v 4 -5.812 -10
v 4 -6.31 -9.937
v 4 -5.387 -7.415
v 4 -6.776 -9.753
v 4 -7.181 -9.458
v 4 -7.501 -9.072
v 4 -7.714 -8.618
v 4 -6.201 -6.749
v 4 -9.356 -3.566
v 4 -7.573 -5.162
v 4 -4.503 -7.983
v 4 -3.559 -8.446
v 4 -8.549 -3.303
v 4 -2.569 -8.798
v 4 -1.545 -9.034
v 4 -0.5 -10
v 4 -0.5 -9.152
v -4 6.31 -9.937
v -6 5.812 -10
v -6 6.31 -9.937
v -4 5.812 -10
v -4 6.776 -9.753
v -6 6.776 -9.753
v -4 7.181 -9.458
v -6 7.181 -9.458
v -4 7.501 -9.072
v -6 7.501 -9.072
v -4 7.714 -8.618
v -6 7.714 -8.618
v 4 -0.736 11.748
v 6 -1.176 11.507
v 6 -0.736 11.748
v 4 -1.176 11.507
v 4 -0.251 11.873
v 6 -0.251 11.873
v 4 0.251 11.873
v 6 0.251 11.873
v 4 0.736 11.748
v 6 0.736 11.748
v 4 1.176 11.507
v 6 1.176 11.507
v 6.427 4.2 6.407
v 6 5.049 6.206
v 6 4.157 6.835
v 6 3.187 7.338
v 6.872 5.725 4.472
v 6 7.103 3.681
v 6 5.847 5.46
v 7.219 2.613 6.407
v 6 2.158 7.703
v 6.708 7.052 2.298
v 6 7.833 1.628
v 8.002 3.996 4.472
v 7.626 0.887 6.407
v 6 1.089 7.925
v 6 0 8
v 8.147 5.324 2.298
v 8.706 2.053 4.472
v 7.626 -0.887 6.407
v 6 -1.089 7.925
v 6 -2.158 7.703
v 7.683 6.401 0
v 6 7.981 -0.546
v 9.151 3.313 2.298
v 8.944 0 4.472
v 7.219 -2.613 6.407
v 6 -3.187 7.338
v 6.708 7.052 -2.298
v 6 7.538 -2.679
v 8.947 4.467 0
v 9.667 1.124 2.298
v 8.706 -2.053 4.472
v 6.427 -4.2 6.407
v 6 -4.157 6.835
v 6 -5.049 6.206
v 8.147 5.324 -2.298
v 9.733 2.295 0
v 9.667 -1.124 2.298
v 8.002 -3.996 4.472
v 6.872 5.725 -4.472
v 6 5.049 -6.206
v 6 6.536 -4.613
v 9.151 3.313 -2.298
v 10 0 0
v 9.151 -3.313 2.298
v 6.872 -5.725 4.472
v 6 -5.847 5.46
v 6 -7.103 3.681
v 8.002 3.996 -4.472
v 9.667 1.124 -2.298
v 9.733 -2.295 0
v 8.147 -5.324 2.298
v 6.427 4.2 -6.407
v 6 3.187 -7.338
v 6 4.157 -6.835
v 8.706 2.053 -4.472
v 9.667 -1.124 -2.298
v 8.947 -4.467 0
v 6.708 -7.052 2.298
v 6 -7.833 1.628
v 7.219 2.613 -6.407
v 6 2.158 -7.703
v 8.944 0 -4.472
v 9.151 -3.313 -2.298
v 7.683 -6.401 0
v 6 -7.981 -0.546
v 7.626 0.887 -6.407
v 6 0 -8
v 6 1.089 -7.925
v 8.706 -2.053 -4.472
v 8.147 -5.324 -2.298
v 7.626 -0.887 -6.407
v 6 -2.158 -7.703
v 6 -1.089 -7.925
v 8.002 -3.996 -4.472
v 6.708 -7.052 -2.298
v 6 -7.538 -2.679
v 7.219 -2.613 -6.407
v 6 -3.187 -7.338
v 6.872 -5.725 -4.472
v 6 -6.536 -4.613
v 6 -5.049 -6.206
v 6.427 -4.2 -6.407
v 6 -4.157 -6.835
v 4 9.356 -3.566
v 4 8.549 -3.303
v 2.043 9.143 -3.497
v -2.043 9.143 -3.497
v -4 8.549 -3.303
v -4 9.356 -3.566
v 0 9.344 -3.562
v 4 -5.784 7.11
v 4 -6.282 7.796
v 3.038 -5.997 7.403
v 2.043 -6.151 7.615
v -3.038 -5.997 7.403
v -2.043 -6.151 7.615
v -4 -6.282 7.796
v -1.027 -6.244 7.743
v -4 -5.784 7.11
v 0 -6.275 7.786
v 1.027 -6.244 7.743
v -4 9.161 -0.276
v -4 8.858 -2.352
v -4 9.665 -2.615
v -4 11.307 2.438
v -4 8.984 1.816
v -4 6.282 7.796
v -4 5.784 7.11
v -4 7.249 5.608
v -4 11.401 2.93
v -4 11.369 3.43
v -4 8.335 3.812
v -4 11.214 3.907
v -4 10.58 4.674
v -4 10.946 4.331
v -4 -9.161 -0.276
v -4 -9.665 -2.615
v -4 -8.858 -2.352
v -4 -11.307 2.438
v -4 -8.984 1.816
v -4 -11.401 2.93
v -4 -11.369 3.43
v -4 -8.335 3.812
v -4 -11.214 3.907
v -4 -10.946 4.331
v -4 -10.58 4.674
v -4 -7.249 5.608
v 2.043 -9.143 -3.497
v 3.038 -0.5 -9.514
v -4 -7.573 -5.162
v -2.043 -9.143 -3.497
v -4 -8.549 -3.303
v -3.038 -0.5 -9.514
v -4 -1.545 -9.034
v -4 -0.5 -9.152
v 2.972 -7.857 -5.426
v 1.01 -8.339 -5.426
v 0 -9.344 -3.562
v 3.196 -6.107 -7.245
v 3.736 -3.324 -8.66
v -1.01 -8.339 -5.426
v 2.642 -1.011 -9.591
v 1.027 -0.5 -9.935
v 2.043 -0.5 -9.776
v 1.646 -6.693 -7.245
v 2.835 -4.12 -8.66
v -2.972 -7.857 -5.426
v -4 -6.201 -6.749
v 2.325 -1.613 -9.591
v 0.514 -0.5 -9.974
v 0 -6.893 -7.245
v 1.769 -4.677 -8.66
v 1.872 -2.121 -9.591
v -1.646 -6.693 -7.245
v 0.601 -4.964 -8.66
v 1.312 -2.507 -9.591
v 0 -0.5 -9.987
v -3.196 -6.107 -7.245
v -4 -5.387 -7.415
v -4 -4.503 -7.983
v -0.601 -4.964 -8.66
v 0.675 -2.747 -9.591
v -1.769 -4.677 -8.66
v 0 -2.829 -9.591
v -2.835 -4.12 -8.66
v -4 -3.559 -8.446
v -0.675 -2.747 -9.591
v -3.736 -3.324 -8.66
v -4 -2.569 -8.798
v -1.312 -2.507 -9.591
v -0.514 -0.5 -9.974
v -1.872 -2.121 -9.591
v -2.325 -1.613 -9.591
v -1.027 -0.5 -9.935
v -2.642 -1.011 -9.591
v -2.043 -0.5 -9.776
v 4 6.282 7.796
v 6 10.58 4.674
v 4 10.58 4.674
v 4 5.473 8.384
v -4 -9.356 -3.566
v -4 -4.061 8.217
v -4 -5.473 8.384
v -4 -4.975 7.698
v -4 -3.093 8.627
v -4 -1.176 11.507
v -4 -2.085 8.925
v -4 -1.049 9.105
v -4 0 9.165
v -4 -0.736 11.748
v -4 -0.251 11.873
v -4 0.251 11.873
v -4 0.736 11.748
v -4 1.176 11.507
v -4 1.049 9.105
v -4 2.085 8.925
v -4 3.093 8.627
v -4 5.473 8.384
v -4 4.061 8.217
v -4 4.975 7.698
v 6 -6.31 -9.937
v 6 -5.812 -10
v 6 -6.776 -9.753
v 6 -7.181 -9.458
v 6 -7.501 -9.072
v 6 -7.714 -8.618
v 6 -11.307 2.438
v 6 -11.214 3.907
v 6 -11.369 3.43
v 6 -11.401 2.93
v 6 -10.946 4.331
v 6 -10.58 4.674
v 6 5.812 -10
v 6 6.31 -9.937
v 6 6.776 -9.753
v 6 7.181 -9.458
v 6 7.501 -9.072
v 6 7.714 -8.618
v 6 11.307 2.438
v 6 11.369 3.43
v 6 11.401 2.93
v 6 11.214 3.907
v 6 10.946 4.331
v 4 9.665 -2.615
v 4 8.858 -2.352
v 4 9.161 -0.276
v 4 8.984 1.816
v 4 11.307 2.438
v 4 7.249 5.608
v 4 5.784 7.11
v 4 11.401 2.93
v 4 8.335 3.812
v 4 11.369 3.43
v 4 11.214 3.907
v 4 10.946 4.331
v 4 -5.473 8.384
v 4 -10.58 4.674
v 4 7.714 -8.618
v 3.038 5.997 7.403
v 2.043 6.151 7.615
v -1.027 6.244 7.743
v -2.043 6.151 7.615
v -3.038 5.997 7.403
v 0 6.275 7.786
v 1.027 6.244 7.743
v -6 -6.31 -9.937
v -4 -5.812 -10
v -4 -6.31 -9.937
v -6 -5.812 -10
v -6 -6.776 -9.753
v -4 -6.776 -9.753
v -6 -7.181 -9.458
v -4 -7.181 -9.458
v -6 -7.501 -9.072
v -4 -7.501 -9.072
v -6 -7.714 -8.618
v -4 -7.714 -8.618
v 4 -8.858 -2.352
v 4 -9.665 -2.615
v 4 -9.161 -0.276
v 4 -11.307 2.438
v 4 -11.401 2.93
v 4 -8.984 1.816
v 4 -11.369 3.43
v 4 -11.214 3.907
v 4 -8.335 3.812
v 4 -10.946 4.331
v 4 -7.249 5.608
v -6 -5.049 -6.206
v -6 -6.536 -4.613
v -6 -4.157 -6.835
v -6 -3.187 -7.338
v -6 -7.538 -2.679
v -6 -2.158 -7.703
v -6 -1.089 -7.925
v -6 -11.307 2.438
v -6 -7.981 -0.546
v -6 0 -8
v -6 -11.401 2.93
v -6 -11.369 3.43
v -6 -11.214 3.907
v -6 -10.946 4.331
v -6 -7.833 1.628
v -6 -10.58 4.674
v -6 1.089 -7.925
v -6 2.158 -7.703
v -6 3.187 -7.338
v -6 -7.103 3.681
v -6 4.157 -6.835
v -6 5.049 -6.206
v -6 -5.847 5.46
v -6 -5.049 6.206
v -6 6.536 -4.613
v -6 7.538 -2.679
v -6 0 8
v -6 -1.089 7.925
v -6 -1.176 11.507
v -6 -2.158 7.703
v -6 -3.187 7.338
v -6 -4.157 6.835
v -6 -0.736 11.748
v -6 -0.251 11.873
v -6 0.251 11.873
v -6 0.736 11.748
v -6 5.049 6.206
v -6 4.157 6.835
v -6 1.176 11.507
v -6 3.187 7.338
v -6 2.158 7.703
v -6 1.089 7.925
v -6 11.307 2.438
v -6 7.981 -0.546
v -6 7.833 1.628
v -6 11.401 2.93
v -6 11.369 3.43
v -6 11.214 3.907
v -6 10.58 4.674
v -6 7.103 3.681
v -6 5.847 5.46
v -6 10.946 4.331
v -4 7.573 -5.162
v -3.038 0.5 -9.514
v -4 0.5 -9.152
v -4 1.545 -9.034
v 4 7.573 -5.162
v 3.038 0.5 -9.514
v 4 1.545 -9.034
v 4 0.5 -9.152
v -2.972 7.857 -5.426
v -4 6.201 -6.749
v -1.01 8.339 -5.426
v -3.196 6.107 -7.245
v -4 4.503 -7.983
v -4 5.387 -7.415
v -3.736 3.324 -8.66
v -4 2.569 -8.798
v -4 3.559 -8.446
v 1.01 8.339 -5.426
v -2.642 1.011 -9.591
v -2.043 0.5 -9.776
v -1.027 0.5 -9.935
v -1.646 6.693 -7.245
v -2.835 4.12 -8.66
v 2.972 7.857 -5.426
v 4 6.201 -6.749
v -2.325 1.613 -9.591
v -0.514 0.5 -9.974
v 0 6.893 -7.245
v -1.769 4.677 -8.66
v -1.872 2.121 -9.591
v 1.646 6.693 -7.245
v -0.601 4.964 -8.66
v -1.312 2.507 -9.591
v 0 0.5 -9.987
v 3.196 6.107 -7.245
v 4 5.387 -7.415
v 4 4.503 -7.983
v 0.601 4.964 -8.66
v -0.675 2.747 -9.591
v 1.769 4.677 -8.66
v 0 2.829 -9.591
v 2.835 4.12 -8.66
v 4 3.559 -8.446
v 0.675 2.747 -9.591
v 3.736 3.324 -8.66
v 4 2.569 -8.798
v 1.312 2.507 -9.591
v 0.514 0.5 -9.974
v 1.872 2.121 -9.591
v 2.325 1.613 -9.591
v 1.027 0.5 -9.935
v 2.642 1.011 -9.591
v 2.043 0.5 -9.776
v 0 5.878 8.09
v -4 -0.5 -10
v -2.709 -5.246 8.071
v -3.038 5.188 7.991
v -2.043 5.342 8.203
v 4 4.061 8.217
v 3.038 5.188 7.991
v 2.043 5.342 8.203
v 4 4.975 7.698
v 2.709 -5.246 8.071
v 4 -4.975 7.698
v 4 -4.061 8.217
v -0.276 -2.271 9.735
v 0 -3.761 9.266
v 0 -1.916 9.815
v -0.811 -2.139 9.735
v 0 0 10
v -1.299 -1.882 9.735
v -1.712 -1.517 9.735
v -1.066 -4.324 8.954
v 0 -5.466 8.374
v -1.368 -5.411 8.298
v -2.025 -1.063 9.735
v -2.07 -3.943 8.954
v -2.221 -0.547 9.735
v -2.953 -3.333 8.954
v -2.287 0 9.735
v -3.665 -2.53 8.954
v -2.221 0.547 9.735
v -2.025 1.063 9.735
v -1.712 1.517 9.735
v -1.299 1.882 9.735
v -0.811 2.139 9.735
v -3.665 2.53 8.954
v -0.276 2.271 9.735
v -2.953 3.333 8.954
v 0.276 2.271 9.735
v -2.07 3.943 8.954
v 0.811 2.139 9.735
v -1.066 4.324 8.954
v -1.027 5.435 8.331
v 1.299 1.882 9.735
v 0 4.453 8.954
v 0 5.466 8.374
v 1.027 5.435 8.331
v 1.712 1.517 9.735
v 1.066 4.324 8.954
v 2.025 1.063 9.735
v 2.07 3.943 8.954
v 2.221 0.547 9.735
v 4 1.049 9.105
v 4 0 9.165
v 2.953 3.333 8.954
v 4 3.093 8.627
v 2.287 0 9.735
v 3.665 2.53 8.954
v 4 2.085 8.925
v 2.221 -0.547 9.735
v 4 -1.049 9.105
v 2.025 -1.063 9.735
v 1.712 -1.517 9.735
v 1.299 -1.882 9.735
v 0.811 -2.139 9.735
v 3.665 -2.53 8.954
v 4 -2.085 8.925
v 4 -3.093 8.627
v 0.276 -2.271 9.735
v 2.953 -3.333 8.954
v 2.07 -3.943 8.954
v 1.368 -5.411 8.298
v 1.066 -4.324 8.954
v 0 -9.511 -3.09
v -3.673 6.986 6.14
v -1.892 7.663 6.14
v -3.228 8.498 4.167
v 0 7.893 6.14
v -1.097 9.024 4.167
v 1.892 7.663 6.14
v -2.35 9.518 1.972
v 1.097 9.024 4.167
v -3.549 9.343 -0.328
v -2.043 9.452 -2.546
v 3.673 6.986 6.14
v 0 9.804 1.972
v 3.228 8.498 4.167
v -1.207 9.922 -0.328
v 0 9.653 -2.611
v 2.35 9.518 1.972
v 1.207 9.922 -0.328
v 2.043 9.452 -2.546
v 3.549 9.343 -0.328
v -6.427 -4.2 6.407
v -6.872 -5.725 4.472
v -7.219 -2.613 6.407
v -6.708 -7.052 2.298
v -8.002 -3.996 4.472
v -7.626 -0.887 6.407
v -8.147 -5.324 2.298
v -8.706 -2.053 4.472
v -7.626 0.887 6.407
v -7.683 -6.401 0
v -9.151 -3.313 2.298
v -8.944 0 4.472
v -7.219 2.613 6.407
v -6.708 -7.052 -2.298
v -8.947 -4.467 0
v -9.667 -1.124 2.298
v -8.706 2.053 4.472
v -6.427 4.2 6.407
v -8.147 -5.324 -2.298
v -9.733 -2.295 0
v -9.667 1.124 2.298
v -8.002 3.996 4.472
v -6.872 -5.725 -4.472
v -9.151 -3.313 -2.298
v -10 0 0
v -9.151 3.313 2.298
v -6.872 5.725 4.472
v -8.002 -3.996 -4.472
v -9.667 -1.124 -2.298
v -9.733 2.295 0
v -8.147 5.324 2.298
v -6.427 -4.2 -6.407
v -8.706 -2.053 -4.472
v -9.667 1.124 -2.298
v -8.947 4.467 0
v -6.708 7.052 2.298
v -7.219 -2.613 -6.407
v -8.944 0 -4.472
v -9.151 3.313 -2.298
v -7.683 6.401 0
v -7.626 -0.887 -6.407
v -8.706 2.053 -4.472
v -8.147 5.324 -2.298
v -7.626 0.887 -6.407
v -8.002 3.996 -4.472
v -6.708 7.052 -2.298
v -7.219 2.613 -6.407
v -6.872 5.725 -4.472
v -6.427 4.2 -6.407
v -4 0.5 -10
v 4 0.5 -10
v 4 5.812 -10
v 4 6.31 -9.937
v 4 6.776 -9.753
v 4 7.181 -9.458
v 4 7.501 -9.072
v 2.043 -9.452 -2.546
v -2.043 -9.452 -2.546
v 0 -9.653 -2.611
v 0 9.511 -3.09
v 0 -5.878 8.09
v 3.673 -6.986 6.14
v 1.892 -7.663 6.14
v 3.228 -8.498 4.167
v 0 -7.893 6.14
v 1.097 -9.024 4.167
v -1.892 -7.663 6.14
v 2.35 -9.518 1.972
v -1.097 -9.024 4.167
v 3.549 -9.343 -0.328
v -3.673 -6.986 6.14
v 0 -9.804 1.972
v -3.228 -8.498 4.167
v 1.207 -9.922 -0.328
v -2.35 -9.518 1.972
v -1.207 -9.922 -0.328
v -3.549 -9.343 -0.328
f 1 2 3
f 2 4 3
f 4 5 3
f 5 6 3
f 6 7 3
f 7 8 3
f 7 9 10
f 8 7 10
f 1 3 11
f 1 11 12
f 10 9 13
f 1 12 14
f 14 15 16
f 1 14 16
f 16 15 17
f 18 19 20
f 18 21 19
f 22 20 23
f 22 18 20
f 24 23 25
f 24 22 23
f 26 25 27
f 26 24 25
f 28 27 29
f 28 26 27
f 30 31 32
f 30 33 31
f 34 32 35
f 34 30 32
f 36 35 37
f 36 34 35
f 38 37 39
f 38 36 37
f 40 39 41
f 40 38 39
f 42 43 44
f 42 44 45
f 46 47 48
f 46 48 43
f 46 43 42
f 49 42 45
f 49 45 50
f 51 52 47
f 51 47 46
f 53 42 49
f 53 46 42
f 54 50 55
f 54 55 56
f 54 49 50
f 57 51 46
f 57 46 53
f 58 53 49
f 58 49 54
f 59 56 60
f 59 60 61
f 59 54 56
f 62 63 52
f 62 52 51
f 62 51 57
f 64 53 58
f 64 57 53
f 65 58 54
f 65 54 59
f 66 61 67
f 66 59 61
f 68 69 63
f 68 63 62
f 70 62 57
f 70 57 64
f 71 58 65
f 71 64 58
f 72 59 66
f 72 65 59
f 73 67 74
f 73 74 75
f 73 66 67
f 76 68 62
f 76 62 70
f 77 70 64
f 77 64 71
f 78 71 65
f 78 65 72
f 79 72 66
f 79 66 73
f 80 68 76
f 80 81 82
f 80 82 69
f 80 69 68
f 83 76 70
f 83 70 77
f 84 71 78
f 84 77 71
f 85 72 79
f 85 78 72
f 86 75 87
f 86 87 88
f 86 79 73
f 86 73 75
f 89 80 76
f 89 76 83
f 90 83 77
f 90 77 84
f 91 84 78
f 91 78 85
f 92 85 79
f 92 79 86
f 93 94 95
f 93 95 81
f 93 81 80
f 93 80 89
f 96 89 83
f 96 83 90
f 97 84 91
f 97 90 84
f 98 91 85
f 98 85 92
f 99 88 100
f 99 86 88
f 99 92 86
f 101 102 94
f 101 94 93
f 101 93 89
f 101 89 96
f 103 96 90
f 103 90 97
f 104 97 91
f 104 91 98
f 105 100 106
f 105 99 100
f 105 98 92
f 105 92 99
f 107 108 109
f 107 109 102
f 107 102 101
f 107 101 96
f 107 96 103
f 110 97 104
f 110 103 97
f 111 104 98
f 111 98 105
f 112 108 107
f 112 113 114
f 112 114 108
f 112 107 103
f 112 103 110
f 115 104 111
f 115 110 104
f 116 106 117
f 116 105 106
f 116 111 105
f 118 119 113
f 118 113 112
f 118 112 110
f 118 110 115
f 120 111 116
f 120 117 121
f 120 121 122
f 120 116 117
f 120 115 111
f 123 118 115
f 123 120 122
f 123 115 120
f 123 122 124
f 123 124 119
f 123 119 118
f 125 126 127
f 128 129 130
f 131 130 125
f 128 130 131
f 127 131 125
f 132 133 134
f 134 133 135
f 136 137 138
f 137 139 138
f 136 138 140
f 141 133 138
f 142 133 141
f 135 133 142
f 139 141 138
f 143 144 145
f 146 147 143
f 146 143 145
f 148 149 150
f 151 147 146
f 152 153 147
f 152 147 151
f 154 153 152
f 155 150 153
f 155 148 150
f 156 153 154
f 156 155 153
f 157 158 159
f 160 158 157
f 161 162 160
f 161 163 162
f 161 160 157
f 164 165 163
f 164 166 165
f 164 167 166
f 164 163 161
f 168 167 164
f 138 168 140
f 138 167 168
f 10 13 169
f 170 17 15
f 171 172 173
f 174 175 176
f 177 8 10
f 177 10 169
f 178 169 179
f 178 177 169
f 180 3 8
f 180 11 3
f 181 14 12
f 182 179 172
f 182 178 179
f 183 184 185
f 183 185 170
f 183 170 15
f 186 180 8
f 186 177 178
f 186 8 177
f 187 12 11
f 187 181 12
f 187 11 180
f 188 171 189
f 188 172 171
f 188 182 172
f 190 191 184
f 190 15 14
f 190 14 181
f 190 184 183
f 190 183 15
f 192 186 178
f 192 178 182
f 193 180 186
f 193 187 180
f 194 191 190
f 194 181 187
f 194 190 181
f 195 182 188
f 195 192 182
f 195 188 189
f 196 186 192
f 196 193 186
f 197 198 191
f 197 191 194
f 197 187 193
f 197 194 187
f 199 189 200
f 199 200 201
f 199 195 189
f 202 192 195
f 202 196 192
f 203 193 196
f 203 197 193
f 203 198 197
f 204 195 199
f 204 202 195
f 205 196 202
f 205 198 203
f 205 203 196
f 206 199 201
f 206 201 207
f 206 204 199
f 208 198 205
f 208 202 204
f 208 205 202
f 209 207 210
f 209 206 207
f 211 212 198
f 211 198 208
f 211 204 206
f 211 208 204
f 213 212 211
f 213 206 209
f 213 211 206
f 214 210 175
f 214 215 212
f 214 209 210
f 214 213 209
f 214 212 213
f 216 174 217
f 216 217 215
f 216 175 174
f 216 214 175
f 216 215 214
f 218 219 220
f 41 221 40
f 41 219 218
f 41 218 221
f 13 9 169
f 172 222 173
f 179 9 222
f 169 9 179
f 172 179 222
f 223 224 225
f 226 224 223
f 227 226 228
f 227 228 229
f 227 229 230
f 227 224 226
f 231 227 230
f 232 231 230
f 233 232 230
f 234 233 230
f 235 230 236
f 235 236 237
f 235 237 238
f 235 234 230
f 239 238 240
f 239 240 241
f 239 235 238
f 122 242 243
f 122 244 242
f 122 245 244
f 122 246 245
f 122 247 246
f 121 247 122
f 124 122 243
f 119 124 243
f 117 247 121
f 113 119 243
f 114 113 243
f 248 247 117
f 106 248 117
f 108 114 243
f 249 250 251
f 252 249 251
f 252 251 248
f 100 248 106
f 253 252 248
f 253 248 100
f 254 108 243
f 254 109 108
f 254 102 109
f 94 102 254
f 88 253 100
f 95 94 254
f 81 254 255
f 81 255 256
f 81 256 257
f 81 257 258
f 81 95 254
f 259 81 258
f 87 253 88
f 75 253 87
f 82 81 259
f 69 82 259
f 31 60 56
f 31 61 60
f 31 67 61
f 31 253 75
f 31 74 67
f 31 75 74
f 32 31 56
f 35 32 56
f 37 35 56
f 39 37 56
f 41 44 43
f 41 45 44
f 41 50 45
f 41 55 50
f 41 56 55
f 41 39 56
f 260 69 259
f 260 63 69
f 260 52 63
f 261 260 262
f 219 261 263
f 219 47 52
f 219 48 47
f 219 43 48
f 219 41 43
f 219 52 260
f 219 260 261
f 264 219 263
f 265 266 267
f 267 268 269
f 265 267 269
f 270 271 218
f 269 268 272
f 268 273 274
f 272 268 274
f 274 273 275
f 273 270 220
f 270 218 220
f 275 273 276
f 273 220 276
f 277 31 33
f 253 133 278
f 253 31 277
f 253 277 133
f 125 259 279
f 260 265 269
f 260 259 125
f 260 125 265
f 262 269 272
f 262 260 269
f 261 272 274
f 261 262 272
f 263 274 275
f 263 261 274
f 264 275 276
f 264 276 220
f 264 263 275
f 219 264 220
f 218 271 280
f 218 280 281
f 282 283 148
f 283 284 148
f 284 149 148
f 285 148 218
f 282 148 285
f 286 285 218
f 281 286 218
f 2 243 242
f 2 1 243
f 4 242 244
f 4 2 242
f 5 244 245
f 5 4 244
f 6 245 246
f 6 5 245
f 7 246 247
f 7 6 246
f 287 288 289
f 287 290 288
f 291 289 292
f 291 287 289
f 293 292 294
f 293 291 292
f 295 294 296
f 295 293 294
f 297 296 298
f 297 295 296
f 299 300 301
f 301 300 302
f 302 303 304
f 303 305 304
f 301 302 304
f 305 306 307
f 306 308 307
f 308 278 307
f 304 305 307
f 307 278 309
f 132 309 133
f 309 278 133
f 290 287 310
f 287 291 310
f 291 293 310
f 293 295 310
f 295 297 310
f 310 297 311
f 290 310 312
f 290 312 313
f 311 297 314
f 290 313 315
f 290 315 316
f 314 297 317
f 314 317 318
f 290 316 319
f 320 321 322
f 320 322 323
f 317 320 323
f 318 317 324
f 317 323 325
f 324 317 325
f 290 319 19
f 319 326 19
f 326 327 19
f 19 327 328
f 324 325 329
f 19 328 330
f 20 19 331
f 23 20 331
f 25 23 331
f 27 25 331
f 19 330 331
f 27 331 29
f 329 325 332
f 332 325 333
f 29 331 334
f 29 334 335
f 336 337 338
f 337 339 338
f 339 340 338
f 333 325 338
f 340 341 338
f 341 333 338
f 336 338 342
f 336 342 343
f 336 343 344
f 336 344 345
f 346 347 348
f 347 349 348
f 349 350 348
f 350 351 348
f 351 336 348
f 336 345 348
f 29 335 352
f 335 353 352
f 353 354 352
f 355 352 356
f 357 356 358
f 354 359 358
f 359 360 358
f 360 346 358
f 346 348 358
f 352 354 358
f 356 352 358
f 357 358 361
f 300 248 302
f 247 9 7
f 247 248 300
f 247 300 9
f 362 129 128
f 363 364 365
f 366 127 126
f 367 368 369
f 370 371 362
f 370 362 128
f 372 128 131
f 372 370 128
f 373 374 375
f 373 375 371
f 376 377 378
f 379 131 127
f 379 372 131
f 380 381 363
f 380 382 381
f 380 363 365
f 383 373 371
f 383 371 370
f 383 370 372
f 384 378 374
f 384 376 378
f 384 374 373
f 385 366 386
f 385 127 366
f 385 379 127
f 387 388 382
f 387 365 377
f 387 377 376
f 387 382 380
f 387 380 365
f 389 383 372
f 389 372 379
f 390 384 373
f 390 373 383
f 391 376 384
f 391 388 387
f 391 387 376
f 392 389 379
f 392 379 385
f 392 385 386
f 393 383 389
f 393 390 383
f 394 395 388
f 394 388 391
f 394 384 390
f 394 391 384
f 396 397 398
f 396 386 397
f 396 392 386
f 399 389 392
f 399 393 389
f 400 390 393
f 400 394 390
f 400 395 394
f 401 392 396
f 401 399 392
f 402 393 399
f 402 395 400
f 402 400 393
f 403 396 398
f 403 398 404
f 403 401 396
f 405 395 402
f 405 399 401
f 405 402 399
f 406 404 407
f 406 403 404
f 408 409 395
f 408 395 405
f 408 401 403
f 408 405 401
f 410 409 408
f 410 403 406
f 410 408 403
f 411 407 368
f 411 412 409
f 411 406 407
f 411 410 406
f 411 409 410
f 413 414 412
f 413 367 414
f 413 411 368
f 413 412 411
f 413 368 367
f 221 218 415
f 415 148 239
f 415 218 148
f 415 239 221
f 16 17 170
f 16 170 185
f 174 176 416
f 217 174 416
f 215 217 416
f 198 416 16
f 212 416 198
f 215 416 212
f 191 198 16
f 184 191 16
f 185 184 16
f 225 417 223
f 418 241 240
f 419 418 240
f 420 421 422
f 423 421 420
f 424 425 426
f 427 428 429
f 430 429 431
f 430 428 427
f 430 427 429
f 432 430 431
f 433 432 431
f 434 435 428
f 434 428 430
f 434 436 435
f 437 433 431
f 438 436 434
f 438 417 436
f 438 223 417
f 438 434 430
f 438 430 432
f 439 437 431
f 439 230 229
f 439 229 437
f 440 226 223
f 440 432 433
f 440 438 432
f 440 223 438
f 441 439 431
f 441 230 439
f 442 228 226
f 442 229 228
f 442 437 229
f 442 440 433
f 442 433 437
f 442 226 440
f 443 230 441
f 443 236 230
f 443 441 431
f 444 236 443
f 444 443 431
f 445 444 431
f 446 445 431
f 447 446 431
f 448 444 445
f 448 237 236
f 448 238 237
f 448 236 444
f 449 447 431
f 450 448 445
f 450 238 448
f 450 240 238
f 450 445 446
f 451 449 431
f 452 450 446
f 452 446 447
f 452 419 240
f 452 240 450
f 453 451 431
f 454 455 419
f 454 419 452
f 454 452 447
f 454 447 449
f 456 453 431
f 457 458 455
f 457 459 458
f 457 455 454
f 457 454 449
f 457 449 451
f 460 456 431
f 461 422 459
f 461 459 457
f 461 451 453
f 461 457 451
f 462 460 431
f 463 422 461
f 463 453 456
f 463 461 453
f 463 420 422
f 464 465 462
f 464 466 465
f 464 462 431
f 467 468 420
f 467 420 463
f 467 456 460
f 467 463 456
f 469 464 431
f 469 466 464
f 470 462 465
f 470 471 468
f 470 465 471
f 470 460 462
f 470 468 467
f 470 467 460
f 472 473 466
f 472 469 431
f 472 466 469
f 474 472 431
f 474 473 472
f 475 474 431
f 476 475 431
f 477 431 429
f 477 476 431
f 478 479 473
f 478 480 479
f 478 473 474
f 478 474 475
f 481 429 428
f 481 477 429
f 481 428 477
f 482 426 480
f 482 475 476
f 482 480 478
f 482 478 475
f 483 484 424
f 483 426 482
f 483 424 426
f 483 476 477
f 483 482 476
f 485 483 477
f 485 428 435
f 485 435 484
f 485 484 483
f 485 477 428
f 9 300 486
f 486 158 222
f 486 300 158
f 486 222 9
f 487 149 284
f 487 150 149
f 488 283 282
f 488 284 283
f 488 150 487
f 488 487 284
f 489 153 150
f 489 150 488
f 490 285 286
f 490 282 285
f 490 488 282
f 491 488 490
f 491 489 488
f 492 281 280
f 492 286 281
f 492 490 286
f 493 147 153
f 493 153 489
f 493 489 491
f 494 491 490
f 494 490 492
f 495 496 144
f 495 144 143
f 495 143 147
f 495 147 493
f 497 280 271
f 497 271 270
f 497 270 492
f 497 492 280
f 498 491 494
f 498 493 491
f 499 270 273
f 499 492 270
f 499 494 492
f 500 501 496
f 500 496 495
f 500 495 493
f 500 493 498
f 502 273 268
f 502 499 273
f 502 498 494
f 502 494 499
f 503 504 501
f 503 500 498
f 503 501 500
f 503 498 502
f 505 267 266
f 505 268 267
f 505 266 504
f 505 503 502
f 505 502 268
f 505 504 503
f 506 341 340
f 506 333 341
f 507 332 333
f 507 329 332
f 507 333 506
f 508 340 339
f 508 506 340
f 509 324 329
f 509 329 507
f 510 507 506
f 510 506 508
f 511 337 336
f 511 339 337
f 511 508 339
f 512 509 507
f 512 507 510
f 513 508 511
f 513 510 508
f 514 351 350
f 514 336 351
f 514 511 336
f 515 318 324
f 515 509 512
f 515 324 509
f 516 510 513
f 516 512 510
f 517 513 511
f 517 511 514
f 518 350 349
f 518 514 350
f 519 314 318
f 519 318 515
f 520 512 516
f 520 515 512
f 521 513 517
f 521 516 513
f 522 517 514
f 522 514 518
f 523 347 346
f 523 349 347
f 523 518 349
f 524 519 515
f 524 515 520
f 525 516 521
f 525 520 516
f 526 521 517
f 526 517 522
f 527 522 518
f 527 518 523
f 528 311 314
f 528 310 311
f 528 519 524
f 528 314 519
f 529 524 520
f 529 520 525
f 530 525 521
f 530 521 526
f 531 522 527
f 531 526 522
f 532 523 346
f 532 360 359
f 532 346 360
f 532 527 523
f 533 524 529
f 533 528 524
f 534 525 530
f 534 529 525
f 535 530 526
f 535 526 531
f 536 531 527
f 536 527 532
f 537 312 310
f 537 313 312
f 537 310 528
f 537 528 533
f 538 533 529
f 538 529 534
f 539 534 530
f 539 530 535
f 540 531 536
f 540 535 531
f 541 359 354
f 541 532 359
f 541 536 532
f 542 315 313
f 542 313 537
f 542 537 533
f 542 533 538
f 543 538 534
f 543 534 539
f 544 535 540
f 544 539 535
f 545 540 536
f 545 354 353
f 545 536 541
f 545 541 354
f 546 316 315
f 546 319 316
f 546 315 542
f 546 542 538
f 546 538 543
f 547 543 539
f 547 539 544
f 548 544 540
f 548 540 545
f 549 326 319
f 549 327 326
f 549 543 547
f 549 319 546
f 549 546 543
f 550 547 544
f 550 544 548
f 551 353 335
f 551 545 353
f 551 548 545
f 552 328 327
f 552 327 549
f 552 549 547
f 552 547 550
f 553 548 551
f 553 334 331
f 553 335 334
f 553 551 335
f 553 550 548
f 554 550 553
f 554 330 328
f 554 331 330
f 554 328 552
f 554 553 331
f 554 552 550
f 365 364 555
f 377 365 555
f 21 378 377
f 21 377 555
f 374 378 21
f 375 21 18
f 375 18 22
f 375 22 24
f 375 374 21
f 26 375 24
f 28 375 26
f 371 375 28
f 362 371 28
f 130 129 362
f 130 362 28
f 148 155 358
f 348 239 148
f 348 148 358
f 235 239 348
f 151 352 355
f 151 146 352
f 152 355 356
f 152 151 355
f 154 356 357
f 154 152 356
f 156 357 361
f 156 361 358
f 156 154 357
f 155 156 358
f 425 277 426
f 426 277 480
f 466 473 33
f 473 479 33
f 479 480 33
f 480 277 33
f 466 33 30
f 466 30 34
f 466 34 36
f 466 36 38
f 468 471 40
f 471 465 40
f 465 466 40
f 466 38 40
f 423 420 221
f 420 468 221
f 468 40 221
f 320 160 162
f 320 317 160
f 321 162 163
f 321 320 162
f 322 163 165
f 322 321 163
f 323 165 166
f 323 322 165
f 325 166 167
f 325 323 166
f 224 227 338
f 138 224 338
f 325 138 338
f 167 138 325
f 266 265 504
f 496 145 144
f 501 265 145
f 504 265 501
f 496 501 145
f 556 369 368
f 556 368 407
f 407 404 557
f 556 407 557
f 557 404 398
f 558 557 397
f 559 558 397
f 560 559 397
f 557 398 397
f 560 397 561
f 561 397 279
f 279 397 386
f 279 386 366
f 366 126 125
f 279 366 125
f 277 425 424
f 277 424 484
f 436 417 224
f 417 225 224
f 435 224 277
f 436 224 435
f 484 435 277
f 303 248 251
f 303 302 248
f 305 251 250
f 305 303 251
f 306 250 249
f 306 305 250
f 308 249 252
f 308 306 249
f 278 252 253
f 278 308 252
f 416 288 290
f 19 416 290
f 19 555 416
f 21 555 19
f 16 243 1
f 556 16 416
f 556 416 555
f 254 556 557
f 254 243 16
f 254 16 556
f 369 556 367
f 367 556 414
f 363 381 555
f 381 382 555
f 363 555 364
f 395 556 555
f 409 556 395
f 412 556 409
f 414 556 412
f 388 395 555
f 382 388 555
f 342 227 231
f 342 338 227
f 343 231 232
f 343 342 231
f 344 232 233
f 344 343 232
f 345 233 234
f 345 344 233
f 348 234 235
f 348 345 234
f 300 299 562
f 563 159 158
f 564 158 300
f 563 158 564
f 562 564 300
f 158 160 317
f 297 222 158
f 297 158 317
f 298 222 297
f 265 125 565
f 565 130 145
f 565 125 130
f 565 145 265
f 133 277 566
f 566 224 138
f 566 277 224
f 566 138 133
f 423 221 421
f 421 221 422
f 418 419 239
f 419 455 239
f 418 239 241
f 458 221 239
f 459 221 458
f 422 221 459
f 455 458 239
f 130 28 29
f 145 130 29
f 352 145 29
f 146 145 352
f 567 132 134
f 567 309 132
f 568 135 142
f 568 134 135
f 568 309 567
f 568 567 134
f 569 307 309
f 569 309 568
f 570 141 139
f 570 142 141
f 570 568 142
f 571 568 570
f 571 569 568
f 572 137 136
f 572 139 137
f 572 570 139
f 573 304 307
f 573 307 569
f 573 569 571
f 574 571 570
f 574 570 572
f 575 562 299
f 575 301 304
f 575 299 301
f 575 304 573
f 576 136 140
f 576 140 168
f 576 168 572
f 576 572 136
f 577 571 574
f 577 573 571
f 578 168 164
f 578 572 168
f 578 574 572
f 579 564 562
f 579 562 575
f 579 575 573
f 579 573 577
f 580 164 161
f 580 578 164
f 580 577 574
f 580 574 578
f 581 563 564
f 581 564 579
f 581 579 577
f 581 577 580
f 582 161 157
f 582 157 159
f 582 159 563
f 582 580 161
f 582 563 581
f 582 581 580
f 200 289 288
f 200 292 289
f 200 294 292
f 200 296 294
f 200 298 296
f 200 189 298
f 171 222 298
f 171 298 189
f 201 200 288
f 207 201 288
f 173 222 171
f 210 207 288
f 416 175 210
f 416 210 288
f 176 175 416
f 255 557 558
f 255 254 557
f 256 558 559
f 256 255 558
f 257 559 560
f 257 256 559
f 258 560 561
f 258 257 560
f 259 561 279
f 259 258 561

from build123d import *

# Parameters (mm, degrees)
F4_DEPTH  = 1
F7_DEPTH  = 1
F8_R      = 2
F10_DEPTH = 8


with BuildPart() as f1:
    # F0 (on Right) → F1 (revolve)
    with BuildSketch(Plane.YZ):
        with BuildLine():
            Line((0, -10), (0, 10))
            ThreePointArc((0, 10), (-10, 0), (0, -10))
        make_face()
    revolve(axis=Axis((0, 0, 0), (0, 0, -1)))

    # F3 (on offset) → F4 (join, symmetric)
    with BuildSketch(Plane.YZ.offset(5)):
        Polygon((-7.2654252801, -10), (7.2654252801, -10), (11.7557050458, 3.8196601125), (0, 12.360679775), (-11.7557050458, 3.8196601125), align=None)
    extrude(amount=F4_DEPTH, both=True)

    # F6 (on offset) → F7 (join, symmetric)
    with BuildSketch(Plane.YZ.offset(-5)):
        Polygon((-7.2654252801, -10), (7.2654252801, -10), (11.7557050458, 3.8196601125), (0, 12.360679775), (-11.7557050458, 3.8196601125), align=None)
    extrude(amount=F7_DEPTH, both=True)

    # F8
    f8_edges = [f1.edges().sort_by_distance(p)[0] for p in [
        (-5, -11.755705, 3.81966),
        (-5, 0, 12.36068),
        (5, 0, 12.36068),
        (5, -11.755705, 3.81966),
        (-5, -7.265425, -10),
        (5, -7.265425, -10),
        (5, 11.755705, 3.81966),
        (-5, 11.755705, 3.81966),
        (5, 7.265425, -10),
        (-5, 7.265425, -10),
    ]]
    fillet(f8_edges, radius=F8_R)

    # F9 (on face) → F10 (join)
    with BuildSketch(Plane.YZ.offset(-4)):
        with BuildLine():
            ThreePointArc((-5.783626767, 7.1098285085), (-5.387140822, 7.4147632305), (-4.9746097726, 7.6976137608))
            Line((-4.9746097726, 7.6976137608), (-5.4733440257, 8.3840625699))
            Line((-5.4733440257, 8.3840625699), (-6.2823610201, 7.7962773176))
            Line((-6.2823610201, 7.7962773176), (-5.783626767, 7.1098285085))
        make_face()
        with BuildLine():
            Line((5.4733440257, 8.3840625699), (4.9746097726, 7.6976137608))
            ThreePointArc((4.9746097726, 7.6976137608), (5.387140822, 7.4147632305), (5.783626767, 7.1098285085))
            Line((5.783626767, 7.1098285085), (6.2823610201, 7.7962773176))
            Line((6.2823610201, 7.7962773176), (5.4733440257, 8.3840625699))
        make_face()
        with BuildLine():
            Line((9.6650736601, -2.6146416856), (8.8581046872, -2.3524415721))
            ThreePointArc((8.8581046872, -2.3524415721), (8.7165769522, -2.8321875355), (8.5490876929, -3.3034980884))
            Line((8.5490876929, -3.3034980884), (9.3560566658, -3.5656982019))
            Line((9.3560566658, -3.5656982019), (9.6650736601, -2.6146416856))
        make_face()
        with BuildLine():
            ThreePointArc((0.5, -9.1515026089), (0, -9.1651513899), (-0.5, -9.1515026089))
            Line((-0.5, -9.1515026089), (-0.5, -10))
            Line((-0.5, -10), (0.5, -10))
            Line((0.5, -10), (0.5, -9.1515026089))
        make_face()
        with BuildLine():
            ThreePointArc((-8.5490876929, -3.3034980884), (-8.7165769522, -2.8321875355), (-8.8581046872, -2.3524415721))
            Line((-8.8581046872, -2.3524415721), (-9.6650736601, -2.6146416856))
            Line((-9.6650736601, -2.6146416856), (-9.3560566658, -3.5656982019))
            Line((-9.3560566658, -3.5656982019), (-8.5490876929, -3.3034980884))
        make_face()
    extrude(amount=F10_DEPTH)


solid = f1.part
